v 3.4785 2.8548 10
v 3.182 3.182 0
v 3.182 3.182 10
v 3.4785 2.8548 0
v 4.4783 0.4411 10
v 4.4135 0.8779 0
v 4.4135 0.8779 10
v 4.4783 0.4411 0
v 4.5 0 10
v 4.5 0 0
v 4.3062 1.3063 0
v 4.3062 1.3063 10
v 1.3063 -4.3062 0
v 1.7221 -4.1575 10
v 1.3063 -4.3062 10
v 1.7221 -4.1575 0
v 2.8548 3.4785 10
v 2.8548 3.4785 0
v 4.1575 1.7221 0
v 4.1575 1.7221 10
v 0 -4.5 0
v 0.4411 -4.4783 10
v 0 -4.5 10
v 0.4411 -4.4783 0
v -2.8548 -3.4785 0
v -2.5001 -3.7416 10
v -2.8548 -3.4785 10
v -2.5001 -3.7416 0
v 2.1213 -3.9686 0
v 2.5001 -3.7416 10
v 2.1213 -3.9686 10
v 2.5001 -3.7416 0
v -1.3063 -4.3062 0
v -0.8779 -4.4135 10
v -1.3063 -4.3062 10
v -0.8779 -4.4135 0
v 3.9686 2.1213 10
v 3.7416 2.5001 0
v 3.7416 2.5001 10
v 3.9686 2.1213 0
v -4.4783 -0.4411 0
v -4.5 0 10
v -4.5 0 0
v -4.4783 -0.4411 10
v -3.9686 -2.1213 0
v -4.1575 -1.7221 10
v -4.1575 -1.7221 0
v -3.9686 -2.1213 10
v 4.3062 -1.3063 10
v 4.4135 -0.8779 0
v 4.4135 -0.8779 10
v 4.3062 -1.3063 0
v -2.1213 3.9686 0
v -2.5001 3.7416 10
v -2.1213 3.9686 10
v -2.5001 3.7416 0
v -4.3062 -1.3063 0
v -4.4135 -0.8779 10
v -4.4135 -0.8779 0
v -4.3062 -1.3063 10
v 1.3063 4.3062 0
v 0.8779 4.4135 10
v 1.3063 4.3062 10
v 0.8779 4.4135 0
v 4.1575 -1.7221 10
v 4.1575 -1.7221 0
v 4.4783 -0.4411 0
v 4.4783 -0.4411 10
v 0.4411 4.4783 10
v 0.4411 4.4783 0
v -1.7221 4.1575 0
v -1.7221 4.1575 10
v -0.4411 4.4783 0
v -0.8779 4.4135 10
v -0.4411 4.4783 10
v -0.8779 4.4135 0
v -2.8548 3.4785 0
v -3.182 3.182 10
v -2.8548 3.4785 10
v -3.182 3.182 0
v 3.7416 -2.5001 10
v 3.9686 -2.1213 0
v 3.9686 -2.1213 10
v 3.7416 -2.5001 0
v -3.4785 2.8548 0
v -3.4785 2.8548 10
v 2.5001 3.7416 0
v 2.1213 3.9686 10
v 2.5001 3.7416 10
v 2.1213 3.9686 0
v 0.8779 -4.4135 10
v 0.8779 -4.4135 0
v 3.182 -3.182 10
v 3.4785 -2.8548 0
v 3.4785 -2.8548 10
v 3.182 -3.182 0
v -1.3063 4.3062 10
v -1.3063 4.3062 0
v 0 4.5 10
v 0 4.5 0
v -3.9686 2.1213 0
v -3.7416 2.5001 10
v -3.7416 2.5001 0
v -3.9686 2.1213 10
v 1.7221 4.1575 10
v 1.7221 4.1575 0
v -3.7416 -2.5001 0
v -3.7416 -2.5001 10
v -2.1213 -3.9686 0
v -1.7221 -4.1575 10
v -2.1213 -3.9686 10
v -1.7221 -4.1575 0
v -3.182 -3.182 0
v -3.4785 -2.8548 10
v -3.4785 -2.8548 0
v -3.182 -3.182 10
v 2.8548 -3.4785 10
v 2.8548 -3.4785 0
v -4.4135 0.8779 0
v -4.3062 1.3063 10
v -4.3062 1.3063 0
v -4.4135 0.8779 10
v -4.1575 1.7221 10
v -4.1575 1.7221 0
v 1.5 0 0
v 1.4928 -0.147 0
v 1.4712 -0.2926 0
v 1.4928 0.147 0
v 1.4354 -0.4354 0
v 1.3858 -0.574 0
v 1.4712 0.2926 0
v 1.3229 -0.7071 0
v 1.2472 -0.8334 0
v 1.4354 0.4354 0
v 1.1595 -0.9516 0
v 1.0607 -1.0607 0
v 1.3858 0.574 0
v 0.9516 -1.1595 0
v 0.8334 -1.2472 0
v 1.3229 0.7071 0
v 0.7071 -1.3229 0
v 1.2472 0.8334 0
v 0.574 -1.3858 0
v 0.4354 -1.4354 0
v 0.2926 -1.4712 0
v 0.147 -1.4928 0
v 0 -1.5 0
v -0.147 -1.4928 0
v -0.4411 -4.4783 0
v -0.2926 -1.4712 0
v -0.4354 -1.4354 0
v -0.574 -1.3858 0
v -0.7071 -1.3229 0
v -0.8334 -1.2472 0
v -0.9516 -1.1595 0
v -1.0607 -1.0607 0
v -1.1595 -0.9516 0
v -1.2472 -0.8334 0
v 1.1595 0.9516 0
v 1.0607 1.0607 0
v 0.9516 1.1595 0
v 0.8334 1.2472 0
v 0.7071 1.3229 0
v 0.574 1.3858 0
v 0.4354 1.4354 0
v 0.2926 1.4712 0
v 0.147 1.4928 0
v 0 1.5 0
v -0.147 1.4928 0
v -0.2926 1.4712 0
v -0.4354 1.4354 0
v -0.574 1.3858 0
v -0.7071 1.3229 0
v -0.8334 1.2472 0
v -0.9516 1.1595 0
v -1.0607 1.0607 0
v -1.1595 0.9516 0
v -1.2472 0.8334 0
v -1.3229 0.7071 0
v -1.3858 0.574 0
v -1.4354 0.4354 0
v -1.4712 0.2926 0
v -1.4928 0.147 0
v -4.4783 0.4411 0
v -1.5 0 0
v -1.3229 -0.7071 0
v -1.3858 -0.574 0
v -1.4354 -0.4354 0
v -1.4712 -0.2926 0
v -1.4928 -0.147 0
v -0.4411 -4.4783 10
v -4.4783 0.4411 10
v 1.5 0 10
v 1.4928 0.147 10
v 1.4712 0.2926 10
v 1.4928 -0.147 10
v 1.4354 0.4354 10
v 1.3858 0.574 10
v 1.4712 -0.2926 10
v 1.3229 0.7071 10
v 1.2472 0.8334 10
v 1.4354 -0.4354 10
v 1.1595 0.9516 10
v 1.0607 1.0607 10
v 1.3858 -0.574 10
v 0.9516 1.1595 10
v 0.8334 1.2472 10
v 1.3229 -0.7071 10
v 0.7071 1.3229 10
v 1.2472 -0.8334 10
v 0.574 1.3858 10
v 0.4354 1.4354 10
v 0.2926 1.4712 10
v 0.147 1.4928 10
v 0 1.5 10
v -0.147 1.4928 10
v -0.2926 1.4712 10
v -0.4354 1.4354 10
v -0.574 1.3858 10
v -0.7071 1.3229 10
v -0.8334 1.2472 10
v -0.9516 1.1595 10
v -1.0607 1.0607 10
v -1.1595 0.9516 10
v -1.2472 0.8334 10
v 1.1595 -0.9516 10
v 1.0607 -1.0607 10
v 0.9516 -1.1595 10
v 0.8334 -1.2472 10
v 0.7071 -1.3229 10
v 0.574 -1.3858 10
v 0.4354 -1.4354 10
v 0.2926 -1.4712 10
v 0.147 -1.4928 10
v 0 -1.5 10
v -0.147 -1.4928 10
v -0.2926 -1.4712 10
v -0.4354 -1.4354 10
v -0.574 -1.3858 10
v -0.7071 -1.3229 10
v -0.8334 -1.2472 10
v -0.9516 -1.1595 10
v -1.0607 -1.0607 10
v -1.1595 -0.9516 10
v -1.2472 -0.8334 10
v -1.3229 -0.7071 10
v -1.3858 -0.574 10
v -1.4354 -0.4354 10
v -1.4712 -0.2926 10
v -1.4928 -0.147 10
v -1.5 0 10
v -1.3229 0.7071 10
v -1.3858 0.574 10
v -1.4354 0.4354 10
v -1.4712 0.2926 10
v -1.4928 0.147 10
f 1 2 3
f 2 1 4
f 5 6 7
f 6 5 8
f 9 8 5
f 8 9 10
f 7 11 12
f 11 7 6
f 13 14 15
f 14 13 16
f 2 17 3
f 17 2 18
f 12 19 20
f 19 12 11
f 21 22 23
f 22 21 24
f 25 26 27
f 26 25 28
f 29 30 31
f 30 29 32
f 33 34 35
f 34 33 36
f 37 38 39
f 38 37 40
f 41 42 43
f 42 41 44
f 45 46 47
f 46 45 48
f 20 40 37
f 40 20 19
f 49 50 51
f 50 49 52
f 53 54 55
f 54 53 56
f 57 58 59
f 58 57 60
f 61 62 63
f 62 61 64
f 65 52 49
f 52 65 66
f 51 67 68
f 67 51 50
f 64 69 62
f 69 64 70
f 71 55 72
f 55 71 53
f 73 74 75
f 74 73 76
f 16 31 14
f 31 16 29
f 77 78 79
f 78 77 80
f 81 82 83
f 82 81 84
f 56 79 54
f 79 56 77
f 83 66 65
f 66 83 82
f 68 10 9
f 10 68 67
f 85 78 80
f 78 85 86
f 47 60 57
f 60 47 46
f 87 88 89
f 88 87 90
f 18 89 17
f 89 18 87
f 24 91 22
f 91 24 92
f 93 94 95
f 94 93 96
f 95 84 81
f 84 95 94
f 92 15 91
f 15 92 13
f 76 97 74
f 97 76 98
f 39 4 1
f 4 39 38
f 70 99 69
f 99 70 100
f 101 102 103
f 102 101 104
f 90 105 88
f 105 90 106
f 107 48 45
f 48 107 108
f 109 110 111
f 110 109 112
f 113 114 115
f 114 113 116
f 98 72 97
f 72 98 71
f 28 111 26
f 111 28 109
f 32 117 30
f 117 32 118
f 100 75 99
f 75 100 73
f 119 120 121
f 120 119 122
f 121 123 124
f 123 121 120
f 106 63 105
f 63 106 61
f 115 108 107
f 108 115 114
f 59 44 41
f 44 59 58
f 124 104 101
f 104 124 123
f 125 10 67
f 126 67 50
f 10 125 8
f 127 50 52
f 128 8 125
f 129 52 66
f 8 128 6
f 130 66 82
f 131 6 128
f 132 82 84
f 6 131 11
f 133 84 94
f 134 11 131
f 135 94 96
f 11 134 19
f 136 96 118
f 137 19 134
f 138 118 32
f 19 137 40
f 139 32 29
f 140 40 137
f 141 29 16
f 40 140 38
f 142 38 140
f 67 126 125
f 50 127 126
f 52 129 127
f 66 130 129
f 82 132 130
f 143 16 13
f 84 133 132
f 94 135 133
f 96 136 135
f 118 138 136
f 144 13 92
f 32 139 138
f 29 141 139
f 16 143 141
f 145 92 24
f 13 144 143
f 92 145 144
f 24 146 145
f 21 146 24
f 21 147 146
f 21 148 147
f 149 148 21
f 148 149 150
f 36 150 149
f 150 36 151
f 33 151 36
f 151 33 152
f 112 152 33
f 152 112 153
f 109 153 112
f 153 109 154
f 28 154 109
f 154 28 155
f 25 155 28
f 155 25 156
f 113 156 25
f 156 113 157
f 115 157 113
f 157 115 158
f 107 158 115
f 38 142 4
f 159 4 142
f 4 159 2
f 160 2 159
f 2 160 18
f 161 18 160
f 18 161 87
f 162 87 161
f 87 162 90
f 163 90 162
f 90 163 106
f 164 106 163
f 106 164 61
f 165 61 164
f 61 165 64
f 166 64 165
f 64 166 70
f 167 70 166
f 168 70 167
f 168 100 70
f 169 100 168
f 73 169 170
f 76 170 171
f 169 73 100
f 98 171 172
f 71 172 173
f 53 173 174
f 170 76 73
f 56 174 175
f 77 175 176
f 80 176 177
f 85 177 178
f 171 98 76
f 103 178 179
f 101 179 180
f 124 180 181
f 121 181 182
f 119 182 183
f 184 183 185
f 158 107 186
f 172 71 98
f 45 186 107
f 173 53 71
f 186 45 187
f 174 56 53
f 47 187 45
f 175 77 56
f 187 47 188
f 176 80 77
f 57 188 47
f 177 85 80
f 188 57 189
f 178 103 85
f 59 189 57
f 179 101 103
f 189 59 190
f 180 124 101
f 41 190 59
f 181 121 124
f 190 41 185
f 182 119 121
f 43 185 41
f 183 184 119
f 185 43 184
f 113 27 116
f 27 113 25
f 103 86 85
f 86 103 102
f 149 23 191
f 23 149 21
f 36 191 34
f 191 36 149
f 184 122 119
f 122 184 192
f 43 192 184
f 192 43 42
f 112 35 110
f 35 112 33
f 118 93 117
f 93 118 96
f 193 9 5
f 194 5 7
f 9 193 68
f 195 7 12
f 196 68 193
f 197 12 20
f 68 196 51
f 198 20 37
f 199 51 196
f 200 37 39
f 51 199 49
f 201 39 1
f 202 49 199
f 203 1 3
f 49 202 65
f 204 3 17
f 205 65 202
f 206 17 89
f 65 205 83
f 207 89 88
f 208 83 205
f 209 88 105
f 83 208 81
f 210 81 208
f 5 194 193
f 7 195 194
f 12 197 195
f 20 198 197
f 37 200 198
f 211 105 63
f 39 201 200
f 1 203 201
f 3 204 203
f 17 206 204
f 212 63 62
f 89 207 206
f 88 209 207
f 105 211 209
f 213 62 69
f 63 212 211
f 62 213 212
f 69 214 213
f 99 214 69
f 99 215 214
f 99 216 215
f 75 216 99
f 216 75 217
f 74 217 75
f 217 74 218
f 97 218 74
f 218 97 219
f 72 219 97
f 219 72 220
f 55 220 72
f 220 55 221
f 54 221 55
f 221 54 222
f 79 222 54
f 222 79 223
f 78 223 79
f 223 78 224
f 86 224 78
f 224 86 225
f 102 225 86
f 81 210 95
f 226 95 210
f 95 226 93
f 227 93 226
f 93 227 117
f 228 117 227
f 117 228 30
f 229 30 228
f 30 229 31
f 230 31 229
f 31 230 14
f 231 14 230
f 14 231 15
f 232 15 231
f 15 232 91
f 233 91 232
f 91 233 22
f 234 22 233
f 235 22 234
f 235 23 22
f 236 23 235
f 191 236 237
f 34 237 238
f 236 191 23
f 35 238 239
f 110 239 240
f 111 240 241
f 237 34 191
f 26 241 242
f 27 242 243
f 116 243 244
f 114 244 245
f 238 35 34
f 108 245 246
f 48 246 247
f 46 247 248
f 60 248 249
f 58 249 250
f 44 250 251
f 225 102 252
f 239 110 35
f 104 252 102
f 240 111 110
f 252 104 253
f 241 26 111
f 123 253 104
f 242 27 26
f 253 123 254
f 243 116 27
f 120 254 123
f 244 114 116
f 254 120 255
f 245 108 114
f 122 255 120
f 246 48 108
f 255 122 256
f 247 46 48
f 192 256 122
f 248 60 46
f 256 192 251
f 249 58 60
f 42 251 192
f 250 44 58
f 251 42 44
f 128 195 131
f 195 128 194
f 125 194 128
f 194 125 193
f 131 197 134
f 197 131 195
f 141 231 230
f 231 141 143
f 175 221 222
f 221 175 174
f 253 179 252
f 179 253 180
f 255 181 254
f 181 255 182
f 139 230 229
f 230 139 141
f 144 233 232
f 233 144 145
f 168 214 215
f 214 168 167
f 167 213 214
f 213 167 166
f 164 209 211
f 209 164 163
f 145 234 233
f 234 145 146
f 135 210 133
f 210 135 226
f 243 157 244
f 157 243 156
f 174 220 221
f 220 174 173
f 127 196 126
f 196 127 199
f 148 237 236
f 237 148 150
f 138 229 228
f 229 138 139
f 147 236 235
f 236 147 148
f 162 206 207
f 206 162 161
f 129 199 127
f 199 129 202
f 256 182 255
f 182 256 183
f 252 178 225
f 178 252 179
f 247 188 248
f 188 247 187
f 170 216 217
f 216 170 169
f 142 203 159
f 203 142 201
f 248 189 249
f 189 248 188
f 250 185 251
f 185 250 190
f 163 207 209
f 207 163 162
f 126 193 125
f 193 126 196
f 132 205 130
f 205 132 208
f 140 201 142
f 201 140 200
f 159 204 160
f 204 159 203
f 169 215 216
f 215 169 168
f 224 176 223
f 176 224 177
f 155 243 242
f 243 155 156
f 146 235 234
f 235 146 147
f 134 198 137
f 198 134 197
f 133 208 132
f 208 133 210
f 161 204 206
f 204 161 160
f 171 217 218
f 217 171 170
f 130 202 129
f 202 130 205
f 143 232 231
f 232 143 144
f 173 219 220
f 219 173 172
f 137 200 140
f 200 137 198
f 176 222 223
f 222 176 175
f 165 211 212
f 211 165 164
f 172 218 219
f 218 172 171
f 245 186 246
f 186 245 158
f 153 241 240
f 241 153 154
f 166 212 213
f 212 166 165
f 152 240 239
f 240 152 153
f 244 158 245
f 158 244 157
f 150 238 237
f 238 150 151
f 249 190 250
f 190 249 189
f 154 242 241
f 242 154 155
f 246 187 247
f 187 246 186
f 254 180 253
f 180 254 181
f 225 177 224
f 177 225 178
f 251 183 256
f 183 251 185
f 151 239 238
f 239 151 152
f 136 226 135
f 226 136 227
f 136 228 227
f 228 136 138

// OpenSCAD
module standoff_pillar() {
    difference() {
        cylinder(h=10.0, d=9.0, $fn=64);
        translate([0, 0, -1])
            cylinder(h=12.0, d=3.0, $fn=64);
    }
}

standoff_pillar();
